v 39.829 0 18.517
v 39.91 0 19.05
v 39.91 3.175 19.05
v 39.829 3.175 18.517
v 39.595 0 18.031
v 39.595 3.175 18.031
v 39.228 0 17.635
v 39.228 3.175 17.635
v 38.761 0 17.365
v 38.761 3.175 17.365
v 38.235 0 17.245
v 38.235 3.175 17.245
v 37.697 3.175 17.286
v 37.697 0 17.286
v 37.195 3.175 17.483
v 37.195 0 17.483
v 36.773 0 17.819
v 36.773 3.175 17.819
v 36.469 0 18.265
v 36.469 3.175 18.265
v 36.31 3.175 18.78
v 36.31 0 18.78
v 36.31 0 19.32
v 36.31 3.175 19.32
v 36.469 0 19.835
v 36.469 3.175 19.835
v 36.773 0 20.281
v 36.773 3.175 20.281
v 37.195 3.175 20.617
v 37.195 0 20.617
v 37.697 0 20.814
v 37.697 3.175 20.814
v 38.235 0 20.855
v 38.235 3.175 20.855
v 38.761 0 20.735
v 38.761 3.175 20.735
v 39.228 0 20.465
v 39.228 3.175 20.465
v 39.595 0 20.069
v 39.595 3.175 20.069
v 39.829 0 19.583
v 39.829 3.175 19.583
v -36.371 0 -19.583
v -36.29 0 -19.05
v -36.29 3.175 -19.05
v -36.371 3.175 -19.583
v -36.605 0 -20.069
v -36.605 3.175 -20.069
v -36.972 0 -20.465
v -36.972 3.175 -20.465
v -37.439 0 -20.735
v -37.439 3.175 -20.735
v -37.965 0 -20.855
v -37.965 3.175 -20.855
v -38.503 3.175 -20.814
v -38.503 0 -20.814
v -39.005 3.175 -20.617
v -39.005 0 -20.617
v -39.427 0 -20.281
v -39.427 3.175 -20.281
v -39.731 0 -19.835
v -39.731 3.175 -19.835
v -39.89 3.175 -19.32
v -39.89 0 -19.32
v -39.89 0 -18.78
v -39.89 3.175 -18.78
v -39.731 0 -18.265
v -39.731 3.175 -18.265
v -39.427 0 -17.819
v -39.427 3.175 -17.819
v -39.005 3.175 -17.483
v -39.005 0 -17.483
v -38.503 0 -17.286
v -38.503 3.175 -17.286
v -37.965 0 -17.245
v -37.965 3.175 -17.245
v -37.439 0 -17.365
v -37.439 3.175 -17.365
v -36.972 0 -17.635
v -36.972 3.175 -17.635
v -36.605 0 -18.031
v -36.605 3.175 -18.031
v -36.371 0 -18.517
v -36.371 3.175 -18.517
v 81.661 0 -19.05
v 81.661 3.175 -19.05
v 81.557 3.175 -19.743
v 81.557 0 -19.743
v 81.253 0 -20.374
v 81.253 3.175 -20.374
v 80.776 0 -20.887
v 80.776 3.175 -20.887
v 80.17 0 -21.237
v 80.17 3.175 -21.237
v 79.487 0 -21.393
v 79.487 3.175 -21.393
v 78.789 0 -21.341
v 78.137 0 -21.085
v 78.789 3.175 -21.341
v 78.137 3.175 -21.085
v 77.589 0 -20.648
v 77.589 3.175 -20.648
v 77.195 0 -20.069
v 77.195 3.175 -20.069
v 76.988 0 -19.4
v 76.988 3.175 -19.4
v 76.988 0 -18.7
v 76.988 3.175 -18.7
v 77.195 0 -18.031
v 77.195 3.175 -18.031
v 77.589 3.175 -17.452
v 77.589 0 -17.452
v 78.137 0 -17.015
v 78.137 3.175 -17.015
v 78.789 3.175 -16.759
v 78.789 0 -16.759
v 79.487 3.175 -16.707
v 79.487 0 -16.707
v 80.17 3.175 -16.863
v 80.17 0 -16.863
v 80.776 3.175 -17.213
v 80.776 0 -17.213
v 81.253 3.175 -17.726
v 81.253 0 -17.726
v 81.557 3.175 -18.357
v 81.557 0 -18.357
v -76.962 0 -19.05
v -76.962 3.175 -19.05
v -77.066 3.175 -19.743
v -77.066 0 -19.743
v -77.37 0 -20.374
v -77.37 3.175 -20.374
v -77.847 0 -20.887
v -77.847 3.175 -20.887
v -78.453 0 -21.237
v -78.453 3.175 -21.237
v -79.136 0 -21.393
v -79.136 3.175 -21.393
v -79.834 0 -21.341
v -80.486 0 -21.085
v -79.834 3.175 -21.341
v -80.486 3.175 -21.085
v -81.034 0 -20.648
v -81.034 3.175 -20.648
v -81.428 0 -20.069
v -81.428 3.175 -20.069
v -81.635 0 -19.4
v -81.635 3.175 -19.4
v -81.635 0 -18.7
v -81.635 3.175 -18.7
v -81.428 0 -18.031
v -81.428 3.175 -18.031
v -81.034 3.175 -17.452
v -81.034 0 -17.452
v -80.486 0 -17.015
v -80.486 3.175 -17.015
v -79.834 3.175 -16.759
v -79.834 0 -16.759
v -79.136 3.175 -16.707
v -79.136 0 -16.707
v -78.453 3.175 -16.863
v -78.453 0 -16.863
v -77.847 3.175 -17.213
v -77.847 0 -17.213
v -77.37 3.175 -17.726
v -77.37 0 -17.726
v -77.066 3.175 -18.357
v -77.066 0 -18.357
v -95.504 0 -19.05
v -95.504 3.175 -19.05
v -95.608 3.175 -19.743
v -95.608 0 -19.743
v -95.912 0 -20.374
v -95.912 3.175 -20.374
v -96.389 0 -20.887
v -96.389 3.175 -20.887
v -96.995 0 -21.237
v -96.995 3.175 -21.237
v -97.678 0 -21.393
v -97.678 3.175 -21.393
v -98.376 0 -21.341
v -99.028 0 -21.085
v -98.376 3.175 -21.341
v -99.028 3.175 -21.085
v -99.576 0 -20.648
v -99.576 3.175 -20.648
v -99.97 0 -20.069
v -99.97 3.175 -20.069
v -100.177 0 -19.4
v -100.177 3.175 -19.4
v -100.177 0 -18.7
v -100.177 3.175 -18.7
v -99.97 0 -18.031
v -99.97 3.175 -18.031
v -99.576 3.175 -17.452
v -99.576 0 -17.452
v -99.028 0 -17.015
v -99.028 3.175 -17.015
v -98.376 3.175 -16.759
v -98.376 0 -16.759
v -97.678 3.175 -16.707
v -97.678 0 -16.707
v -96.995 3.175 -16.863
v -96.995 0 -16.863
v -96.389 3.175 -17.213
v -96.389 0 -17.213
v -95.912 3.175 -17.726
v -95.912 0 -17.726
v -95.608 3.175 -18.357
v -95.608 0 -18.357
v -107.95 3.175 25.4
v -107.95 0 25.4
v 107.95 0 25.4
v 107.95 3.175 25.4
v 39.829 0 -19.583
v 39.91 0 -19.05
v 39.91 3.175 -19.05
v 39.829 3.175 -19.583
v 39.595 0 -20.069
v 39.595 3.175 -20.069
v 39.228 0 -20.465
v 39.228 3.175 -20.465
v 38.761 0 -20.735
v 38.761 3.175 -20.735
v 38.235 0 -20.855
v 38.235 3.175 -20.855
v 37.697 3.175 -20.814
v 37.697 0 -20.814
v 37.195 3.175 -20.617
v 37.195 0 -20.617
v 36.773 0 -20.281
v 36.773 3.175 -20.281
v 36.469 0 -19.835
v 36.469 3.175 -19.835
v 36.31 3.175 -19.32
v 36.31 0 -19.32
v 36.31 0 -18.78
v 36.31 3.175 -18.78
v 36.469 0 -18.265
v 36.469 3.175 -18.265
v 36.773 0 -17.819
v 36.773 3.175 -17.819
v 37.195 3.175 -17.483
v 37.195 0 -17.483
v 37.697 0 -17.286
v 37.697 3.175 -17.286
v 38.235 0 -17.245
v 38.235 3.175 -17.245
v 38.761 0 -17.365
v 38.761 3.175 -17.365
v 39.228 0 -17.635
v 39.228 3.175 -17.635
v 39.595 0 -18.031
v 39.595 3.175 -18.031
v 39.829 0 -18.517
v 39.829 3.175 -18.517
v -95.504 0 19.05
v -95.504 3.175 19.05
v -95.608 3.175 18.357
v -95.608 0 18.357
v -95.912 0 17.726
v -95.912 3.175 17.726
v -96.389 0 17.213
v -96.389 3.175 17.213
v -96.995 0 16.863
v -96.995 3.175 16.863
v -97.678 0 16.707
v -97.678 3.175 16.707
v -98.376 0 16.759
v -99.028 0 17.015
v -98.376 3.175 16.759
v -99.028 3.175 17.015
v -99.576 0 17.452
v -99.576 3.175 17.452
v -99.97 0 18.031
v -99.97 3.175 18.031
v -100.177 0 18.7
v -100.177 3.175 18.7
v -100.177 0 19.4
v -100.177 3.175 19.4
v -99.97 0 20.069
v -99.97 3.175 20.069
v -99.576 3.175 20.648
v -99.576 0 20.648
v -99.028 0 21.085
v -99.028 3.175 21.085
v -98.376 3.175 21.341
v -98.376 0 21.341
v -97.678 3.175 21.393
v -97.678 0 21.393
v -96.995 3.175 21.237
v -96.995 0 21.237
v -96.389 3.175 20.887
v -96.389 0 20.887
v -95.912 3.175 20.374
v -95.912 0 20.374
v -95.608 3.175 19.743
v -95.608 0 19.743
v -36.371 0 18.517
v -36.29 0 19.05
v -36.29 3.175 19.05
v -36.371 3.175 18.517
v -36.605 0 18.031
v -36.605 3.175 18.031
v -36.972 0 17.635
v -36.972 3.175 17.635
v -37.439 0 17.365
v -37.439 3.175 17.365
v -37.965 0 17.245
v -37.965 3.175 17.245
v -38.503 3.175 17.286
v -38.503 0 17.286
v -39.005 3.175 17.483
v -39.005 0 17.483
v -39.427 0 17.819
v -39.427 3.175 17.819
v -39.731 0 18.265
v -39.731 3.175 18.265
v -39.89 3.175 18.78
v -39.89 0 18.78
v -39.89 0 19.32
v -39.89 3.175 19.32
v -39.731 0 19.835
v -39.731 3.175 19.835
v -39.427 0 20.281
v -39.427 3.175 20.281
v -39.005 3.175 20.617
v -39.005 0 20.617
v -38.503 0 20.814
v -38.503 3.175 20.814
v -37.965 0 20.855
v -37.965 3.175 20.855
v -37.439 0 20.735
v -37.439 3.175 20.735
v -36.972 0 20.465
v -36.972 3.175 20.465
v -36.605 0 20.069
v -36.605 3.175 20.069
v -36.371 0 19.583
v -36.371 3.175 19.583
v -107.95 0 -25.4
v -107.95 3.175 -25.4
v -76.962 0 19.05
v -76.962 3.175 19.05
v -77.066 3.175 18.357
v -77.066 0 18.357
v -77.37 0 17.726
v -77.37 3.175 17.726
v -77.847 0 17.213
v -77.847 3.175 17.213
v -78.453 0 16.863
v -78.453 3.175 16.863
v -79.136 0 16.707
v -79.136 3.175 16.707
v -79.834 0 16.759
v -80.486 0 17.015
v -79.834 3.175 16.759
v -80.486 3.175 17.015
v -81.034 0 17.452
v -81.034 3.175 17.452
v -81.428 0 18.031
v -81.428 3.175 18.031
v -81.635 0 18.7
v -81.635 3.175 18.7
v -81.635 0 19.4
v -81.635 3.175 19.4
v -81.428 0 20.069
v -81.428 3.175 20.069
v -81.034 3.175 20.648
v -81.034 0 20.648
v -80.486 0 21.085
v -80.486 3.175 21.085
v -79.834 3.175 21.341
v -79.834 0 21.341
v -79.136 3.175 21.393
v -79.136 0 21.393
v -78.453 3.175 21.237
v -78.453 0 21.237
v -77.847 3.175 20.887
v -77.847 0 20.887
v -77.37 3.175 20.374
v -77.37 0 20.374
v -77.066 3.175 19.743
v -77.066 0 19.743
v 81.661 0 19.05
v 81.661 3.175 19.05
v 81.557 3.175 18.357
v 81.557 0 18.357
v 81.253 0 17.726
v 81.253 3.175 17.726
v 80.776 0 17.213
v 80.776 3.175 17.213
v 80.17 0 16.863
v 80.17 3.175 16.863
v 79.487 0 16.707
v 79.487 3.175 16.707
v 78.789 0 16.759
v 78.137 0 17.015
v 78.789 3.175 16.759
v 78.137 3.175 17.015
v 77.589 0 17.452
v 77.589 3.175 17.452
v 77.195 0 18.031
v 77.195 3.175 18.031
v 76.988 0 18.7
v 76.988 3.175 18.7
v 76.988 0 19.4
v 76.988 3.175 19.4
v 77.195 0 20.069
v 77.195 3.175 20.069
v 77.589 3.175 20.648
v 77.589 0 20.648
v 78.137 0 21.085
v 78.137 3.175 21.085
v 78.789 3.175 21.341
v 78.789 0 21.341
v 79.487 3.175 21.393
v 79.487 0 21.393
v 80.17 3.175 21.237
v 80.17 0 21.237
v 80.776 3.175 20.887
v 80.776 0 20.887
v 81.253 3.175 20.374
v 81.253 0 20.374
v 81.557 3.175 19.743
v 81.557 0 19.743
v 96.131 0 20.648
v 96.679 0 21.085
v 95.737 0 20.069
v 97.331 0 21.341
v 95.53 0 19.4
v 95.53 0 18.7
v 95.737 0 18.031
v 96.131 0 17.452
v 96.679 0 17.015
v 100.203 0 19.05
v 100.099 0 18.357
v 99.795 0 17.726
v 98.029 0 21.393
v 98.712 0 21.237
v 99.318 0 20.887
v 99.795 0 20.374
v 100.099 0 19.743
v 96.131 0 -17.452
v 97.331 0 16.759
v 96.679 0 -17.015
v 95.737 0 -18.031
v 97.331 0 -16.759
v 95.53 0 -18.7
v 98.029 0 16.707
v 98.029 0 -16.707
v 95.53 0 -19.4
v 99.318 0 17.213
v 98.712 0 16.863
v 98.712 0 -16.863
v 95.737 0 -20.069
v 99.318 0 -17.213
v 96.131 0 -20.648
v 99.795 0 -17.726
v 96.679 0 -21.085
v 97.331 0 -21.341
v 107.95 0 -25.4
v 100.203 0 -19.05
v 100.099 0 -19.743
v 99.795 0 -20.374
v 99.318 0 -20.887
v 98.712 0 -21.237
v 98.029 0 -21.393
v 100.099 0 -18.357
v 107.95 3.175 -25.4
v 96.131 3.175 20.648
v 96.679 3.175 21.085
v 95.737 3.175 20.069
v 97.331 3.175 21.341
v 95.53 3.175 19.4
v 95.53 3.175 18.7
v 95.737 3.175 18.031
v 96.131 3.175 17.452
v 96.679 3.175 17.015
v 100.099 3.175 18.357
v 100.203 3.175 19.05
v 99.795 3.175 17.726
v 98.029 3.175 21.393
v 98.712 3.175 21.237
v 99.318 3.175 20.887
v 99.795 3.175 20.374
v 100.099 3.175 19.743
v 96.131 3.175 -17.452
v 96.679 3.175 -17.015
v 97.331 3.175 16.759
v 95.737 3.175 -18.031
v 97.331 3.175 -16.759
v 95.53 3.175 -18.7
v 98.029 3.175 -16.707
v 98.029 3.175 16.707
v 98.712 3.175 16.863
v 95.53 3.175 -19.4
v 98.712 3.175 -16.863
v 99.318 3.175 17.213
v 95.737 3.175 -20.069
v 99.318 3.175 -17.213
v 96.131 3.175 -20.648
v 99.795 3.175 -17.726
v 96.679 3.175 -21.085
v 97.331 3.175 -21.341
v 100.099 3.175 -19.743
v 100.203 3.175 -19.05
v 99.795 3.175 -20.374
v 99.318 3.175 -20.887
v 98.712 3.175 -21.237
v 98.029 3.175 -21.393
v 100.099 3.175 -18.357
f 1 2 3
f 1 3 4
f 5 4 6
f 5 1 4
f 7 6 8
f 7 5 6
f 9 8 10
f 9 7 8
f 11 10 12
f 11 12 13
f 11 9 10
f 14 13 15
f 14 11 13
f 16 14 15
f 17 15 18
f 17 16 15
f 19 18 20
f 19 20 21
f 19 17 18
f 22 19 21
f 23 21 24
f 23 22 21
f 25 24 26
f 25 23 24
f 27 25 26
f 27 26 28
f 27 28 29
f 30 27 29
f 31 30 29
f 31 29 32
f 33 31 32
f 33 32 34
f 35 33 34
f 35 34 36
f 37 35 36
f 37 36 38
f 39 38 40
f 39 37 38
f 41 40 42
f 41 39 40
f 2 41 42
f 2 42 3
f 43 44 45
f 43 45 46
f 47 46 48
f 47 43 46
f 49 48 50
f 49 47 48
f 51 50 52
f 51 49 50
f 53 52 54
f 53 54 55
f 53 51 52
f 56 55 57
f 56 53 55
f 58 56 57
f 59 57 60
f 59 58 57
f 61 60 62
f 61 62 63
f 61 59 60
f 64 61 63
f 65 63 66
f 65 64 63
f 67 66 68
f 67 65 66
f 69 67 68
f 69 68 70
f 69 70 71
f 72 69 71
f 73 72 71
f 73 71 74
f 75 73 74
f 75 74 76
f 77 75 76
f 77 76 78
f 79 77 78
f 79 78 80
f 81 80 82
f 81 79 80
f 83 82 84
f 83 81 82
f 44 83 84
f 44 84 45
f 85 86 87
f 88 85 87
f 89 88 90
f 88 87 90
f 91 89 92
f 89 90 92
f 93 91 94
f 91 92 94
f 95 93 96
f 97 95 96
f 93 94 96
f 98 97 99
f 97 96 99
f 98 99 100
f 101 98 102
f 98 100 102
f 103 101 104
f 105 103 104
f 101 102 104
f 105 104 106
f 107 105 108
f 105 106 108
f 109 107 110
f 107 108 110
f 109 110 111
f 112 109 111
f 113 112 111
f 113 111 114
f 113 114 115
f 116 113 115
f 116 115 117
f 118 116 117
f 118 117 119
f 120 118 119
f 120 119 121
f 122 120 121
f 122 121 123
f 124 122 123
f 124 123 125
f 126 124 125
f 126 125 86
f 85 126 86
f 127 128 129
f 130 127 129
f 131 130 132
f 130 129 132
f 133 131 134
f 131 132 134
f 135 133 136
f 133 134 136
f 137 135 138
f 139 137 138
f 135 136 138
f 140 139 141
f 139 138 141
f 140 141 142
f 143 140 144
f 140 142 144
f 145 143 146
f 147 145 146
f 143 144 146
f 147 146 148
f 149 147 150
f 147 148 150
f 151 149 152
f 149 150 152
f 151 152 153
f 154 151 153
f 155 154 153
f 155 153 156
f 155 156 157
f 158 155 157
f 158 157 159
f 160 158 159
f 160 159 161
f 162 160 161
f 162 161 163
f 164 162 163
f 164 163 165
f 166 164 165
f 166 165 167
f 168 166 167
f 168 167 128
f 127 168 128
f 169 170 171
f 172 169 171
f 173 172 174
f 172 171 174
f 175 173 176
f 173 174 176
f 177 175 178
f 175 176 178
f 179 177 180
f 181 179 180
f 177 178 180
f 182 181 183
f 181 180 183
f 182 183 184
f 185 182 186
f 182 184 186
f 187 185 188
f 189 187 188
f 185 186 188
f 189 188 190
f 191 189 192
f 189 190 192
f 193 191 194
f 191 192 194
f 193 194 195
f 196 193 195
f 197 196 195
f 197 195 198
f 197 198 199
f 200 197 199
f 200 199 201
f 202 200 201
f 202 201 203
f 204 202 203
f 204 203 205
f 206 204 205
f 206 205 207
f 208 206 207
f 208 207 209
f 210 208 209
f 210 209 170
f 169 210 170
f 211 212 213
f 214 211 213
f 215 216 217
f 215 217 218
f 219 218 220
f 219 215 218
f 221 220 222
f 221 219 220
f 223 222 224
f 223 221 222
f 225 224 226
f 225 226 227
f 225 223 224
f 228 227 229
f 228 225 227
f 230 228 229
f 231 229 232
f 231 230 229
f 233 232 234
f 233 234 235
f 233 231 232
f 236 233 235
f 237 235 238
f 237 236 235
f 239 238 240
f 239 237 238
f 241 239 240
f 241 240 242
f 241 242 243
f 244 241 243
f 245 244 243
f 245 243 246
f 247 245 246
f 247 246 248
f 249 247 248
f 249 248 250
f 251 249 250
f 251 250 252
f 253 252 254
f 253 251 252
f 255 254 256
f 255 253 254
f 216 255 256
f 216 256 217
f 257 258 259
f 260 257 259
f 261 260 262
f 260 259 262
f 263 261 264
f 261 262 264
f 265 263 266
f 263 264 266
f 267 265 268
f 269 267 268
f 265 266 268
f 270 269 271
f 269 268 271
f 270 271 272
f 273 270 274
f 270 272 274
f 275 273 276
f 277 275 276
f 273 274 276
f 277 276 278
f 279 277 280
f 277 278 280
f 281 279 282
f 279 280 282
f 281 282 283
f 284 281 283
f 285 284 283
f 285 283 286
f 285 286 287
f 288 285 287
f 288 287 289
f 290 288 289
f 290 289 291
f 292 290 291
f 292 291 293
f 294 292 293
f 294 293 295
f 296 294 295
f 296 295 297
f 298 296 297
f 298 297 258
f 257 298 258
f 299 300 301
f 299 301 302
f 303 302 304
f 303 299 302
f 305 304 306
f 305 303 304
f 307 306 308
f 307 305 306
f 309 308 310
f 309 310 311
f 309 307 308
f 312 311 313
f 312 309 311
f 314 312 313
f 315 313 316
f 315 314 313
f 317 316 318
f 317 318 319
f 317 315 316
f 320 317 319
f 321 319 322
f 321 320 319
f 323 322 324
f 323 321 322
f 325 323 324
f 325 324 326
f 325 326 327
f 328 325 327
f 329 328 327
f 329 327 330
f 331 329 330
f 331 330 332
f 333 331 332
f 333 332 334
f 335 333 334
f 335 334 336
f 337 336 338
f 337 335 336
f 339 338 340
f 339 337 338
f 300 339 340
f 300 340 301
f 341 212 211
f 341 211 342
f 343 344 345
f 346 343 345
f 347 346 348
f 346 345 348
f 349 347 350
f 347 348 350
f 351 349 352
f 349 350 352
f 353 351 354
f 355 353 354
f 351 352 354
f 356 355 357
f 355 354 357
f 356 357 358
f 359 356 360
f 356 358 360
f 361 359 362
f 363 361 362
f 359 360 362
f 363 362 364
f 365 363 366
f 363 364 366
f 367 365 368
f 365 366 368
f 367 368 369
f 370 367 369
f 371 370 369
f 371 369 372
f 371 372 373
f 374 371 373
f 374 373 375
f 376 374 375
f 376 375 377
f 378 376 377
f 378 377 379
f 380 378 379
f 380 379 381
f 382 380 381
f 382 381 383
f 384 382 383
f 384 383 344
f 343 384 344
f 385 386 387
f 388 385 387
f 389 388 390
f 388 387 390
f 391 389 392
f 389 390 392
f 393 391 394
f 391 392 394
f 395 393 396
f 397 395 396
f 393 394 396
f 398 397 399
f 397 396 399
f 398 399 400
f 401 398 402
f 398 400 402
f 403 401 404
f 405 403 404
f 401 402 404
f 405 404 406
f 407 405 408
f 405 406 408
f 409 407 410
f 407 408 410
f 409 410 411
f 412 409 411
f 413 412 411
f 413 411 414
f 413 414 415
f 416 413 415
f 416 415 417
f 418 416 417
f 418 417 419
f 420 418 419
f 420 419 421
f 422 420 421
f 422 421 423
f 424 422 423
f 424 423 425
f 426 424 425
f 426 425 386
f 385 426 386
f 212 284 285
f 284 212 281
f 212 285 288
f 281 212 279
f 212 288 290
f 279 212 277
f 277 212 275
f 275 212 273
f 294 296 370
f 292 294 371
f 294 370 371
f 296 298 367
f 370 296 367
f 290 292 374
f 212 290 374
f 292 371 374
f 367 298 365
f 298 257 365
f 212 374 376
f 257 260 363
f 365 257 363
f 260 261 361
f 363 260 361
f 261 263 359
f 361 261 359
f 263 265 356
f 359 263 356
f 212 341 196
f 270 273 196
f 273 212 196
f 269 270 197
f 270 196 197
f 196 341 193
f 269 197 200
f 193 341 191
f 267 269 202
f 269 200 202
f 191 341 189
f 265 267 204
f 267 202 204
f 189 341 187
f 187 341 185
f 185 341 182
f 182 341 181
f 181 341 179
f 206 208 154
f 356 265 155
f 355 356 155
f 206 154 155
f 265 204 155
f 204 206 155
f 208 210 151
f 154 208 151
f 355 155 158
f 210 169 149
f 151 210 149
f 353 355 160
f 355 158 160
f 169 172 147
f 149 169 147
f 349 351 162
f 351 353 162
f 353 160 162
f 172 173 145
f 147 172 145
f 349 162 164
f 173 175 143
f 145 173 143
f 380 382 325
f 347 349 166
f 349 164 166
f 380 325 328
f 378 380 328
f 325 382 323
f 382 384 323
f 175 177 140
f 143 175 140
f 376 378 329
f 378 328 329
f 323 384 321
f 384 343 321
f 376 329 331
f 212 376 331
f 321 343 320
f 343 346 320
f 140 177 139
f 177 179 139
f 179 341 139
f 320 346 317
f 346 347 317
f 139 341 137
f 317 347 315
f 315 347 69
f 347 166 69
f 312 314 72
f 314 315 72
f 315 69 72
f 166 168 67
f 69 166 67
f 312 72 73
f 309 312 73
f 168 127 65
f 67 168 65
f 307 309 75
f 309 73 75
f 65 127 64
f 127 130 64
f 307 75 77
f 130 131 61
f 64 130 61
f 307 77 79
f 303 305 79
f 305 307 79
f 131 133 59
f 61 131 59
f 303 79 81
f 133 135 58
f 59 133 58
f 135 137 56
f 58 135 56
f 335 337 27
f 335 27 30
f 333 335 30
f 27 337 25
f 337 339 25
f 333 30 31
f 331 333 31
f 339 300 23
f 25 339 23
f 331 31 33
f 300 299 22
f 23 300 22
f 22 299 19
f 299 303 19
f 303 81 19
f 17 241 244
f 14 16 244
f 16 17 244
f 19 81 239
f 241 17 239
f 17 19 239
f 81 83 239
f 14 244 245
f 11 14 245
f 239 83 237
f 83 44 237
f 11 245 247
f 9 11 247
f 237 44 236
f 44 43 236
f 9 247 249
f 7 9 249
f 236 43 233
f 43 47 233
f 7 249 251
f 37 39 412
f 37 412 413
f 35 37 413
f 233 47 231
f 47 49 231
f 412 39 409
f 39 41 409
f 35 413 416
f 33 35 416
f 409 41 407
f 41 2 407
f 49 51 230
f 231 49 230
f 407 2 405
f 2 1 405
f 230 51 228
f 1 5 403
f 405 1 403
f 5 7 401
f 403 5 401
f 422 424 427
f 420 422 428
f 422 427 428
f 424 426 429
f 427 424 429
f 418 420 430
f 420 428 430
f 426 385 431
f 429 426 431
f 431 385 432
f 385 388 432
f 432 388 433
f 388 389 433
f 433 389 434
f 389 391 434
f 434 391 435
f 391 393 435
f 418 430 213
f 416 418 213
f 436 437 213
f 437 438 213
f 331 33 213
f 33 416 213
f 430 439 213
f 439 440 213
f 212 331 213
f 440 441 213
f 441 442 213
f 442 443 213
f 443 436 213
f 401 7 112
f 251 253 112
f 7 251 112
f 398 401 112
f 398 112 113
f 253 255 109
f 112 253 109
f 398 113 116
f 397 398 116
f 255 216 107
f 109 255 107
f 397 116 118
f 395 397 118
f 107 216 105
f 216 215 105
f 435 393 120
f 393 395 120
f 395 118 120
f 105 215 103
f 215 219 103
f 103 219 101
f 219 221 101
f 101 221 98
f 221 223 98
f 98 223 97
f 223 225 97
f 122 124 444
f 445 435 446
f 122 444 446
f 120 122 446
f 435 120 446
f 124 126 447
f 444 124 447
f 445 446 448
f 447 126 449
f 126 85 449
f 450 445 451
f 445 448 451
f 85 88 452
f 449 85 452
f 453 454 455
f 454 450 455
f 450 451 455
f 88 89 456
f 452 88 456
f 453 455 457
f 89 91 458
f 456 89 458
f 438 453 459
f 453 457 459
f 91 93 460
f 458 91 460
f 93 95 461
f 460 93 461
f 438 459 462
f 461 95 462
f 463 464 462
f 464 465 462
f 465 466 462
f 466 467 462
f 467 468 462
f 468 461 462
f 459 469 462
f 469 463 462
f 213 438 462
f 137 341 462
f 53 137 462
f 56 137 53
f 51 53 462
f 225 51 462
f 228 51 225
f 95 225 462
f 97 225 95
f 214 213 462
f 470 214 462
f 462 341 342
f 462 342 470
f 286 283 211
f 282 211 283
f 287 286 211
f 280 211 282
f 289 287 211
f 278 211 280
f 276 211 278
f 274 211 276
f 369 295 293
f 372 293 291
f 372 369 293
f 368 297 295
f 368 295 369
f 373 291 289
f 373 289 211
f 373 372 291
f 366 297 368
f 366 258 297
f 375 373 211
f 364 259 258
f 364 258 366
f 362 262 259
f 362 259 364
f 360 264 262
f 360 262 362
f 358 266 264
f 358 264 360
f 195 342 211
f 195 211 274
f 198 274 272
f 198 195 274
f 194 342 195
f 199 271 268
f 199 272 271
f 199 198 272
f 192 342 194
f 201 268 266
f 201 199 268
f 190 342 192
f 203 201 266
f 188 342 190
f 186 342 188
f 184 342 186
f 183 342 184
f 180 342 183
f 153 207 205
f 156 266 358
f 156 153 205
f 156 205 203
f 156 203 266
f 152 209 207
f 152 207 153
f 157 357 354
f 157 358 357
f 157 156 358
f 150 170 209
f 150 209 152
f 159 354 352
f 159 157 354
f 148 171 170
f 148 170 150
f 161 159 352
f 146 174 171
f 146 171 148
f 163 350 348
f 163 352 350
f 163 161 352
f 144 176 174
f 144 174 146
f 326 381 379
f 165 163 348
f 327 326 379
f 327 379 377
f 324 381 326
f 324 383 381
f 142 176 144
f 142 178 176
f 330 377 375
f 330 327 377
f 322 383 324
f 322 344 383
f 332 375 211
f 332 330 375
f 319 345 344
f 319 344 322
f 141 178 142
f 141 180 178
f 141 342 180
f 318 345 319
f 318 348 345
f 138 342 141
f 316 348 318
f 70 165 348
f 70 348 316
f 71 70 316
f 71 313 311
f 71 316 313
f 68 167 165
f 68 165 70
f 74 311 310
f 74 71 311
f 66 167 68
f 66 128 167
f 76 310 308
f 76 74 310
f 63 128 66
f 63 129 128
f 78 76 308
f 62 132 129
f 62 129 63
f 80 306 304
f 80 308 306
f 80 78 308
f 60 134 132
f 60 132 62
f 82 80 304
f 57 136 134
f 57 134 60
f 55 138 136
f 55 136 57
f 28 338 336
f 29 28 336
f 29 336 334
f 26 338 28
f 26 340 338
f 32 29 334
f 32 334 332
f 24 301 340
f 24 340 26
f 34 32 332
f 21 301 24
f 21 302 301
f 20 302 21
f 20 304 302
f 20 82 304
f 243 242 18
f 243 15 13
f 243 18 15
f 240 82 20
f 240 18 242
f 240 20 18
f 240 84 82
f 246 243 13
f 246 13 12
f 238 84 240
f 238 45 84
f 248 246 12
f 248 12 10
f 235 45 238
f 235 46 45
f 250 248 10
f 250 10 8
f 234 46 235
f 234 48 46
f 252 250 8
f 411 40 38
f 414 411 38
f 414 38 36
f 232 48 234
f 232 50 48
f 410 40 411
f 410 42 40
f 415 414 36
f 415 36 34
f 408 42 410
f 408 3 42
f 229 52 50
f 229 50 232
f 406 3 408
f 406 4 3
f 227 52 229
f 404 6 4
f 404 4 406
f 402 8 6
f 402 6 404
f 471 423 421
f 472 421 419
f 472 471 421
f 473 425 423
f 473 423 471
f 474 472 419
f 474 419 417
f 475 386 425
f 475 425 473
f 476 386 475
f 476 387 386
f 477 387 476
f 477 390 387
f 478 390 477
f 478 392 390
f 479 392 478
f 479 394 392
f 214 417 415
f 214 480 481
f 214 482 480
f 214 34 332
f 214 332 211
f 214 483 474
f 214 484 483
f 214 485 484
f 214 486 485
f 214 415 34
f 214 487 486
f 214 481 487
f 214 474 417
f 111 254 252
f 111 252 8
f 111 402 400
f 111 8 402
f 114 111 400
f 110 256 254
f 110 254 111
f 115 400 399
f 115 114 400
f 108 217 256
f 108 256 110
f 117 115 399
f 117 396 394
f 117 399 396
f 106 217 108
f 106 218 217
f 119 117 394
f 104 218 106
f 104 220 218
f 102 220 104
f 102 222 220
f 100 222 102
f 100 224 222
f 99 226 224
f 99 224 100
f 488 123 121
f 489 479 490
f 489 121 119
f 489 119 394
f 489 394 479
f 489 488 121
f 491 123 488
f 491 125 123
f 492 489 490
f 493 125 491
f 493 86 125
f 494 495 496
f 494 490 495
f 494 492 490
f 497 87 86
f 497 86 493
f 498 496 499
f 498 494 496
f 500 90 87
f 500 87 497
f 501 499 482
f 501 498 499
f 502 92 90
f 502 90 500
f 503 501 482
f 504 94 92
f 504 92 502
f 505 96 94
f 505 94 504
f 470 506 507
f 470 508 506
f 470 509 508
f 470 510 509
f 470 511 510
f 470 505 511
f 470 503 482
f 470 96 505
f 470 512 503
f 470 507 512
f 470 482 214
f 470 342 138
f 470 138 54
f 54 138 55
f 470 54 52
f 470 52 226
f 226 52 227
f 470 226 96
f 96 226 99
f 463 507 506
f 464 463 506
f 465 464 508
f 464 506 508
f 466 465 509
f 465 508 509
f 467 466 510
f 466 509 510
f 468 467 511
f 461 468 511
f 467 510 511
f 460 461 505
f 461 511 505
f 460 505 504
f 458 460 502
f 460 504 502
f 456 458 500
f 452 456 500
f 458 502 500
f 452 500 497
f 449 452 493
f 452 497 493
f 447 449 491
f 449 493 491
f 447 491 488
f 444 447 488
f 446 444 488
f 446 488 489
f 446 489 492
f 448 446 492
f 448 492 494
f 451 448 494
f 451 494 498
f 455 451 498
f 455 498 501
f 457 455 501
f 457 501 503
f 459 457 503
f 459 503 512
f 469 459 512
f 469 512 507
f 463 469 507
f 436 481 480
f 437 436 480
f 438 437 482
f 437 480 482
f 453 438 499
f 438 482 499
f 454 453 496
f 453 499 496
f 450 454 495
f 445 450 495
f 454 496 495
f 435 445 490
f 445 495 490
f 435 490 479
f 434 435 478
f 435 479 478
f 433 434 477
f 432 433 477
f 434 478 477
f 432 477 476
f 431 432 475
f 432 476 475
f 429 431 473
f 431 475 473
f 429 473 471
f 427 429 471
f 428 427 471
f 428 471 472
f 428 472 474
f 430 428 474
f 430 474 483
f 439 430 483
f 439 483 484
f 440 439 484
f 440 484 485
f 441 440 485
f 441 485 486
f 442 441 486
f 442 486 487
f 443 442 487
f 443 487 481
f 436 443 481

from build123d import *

# Parameters (mm, degrees)
SKETCH1_W           = 215.9
SKETCH1_H           = 50.8
SKETCH1_R           = 1.80975
BOSS_EXTRUDE1_DEPTH = 3.175
SKETCH2_R           = 2.3495
CUT_EXTRUDE1_DEPTH  = 4.175


with BuildPart() as part:
    # Sketch1 → Boss-Extrude1 (new body)
    with BuildSketch(Plane(origin=(0, 0, 0), x_dir=(1, 0, 0), z_dir=(0, 1, 0))):
        Rectangle(SKETCH1_W, SKETCH1_H)
        with Locations((-38.1, 19.05)):
            Circle(SKETCH1_R, mode=Mode.SUBTRACT)
        with Locations((-38.1, -19.05)):
            Circle(SKETCH1_R, mode=Mode.SUBTRACT)
        with Locations((38.1, 19.05)):
            Circle(SKETCH1_R, mode=Mode.SUBTRACT)
        with Locations((38.1, -19.05)):
            Circle(SKETCH1_R, mode=Mode.SUBTRACT)
    extrude(amount=BOSS_EXTRUDE1_DEPTH)

    # Sketch2 → Cut-Extrude1 (cut, through all)
    with BuildSketch(Plane(origin=(0, 3.175, 0), x_dir=(1, 0, 0), z_dir=(0, 1, 0))):
        with Locations((-97.8535, 19.05)):
            Circle(SKETCH2_R)
        with Locations((-79.3115, 19.05)):
            Circle(SKETCH2_R)
        with Locations((-79.3115, -19.05)):
            Circle(SKETCH2_R)
        with Locations((-97.8535, -19.05)):
            Circle(SKETCH2_R)
        with Locations((97.8535, -19.05)):
            Circle(SKETCH2_R)
        with Locations((79.3115, -19.05)):
            Circle(SKETCH2_R)
        with Locations((79.3115, 19.05)):
            Circle(SKETCH2_R)
        with Locations((97.8535, 19.05)):
            Circle(SKETCH2_R)
    extrude(amount=-CUT_EXTRUDE1_DEPTH, mode=Mode.SUBTRACT)


solid = part.part
